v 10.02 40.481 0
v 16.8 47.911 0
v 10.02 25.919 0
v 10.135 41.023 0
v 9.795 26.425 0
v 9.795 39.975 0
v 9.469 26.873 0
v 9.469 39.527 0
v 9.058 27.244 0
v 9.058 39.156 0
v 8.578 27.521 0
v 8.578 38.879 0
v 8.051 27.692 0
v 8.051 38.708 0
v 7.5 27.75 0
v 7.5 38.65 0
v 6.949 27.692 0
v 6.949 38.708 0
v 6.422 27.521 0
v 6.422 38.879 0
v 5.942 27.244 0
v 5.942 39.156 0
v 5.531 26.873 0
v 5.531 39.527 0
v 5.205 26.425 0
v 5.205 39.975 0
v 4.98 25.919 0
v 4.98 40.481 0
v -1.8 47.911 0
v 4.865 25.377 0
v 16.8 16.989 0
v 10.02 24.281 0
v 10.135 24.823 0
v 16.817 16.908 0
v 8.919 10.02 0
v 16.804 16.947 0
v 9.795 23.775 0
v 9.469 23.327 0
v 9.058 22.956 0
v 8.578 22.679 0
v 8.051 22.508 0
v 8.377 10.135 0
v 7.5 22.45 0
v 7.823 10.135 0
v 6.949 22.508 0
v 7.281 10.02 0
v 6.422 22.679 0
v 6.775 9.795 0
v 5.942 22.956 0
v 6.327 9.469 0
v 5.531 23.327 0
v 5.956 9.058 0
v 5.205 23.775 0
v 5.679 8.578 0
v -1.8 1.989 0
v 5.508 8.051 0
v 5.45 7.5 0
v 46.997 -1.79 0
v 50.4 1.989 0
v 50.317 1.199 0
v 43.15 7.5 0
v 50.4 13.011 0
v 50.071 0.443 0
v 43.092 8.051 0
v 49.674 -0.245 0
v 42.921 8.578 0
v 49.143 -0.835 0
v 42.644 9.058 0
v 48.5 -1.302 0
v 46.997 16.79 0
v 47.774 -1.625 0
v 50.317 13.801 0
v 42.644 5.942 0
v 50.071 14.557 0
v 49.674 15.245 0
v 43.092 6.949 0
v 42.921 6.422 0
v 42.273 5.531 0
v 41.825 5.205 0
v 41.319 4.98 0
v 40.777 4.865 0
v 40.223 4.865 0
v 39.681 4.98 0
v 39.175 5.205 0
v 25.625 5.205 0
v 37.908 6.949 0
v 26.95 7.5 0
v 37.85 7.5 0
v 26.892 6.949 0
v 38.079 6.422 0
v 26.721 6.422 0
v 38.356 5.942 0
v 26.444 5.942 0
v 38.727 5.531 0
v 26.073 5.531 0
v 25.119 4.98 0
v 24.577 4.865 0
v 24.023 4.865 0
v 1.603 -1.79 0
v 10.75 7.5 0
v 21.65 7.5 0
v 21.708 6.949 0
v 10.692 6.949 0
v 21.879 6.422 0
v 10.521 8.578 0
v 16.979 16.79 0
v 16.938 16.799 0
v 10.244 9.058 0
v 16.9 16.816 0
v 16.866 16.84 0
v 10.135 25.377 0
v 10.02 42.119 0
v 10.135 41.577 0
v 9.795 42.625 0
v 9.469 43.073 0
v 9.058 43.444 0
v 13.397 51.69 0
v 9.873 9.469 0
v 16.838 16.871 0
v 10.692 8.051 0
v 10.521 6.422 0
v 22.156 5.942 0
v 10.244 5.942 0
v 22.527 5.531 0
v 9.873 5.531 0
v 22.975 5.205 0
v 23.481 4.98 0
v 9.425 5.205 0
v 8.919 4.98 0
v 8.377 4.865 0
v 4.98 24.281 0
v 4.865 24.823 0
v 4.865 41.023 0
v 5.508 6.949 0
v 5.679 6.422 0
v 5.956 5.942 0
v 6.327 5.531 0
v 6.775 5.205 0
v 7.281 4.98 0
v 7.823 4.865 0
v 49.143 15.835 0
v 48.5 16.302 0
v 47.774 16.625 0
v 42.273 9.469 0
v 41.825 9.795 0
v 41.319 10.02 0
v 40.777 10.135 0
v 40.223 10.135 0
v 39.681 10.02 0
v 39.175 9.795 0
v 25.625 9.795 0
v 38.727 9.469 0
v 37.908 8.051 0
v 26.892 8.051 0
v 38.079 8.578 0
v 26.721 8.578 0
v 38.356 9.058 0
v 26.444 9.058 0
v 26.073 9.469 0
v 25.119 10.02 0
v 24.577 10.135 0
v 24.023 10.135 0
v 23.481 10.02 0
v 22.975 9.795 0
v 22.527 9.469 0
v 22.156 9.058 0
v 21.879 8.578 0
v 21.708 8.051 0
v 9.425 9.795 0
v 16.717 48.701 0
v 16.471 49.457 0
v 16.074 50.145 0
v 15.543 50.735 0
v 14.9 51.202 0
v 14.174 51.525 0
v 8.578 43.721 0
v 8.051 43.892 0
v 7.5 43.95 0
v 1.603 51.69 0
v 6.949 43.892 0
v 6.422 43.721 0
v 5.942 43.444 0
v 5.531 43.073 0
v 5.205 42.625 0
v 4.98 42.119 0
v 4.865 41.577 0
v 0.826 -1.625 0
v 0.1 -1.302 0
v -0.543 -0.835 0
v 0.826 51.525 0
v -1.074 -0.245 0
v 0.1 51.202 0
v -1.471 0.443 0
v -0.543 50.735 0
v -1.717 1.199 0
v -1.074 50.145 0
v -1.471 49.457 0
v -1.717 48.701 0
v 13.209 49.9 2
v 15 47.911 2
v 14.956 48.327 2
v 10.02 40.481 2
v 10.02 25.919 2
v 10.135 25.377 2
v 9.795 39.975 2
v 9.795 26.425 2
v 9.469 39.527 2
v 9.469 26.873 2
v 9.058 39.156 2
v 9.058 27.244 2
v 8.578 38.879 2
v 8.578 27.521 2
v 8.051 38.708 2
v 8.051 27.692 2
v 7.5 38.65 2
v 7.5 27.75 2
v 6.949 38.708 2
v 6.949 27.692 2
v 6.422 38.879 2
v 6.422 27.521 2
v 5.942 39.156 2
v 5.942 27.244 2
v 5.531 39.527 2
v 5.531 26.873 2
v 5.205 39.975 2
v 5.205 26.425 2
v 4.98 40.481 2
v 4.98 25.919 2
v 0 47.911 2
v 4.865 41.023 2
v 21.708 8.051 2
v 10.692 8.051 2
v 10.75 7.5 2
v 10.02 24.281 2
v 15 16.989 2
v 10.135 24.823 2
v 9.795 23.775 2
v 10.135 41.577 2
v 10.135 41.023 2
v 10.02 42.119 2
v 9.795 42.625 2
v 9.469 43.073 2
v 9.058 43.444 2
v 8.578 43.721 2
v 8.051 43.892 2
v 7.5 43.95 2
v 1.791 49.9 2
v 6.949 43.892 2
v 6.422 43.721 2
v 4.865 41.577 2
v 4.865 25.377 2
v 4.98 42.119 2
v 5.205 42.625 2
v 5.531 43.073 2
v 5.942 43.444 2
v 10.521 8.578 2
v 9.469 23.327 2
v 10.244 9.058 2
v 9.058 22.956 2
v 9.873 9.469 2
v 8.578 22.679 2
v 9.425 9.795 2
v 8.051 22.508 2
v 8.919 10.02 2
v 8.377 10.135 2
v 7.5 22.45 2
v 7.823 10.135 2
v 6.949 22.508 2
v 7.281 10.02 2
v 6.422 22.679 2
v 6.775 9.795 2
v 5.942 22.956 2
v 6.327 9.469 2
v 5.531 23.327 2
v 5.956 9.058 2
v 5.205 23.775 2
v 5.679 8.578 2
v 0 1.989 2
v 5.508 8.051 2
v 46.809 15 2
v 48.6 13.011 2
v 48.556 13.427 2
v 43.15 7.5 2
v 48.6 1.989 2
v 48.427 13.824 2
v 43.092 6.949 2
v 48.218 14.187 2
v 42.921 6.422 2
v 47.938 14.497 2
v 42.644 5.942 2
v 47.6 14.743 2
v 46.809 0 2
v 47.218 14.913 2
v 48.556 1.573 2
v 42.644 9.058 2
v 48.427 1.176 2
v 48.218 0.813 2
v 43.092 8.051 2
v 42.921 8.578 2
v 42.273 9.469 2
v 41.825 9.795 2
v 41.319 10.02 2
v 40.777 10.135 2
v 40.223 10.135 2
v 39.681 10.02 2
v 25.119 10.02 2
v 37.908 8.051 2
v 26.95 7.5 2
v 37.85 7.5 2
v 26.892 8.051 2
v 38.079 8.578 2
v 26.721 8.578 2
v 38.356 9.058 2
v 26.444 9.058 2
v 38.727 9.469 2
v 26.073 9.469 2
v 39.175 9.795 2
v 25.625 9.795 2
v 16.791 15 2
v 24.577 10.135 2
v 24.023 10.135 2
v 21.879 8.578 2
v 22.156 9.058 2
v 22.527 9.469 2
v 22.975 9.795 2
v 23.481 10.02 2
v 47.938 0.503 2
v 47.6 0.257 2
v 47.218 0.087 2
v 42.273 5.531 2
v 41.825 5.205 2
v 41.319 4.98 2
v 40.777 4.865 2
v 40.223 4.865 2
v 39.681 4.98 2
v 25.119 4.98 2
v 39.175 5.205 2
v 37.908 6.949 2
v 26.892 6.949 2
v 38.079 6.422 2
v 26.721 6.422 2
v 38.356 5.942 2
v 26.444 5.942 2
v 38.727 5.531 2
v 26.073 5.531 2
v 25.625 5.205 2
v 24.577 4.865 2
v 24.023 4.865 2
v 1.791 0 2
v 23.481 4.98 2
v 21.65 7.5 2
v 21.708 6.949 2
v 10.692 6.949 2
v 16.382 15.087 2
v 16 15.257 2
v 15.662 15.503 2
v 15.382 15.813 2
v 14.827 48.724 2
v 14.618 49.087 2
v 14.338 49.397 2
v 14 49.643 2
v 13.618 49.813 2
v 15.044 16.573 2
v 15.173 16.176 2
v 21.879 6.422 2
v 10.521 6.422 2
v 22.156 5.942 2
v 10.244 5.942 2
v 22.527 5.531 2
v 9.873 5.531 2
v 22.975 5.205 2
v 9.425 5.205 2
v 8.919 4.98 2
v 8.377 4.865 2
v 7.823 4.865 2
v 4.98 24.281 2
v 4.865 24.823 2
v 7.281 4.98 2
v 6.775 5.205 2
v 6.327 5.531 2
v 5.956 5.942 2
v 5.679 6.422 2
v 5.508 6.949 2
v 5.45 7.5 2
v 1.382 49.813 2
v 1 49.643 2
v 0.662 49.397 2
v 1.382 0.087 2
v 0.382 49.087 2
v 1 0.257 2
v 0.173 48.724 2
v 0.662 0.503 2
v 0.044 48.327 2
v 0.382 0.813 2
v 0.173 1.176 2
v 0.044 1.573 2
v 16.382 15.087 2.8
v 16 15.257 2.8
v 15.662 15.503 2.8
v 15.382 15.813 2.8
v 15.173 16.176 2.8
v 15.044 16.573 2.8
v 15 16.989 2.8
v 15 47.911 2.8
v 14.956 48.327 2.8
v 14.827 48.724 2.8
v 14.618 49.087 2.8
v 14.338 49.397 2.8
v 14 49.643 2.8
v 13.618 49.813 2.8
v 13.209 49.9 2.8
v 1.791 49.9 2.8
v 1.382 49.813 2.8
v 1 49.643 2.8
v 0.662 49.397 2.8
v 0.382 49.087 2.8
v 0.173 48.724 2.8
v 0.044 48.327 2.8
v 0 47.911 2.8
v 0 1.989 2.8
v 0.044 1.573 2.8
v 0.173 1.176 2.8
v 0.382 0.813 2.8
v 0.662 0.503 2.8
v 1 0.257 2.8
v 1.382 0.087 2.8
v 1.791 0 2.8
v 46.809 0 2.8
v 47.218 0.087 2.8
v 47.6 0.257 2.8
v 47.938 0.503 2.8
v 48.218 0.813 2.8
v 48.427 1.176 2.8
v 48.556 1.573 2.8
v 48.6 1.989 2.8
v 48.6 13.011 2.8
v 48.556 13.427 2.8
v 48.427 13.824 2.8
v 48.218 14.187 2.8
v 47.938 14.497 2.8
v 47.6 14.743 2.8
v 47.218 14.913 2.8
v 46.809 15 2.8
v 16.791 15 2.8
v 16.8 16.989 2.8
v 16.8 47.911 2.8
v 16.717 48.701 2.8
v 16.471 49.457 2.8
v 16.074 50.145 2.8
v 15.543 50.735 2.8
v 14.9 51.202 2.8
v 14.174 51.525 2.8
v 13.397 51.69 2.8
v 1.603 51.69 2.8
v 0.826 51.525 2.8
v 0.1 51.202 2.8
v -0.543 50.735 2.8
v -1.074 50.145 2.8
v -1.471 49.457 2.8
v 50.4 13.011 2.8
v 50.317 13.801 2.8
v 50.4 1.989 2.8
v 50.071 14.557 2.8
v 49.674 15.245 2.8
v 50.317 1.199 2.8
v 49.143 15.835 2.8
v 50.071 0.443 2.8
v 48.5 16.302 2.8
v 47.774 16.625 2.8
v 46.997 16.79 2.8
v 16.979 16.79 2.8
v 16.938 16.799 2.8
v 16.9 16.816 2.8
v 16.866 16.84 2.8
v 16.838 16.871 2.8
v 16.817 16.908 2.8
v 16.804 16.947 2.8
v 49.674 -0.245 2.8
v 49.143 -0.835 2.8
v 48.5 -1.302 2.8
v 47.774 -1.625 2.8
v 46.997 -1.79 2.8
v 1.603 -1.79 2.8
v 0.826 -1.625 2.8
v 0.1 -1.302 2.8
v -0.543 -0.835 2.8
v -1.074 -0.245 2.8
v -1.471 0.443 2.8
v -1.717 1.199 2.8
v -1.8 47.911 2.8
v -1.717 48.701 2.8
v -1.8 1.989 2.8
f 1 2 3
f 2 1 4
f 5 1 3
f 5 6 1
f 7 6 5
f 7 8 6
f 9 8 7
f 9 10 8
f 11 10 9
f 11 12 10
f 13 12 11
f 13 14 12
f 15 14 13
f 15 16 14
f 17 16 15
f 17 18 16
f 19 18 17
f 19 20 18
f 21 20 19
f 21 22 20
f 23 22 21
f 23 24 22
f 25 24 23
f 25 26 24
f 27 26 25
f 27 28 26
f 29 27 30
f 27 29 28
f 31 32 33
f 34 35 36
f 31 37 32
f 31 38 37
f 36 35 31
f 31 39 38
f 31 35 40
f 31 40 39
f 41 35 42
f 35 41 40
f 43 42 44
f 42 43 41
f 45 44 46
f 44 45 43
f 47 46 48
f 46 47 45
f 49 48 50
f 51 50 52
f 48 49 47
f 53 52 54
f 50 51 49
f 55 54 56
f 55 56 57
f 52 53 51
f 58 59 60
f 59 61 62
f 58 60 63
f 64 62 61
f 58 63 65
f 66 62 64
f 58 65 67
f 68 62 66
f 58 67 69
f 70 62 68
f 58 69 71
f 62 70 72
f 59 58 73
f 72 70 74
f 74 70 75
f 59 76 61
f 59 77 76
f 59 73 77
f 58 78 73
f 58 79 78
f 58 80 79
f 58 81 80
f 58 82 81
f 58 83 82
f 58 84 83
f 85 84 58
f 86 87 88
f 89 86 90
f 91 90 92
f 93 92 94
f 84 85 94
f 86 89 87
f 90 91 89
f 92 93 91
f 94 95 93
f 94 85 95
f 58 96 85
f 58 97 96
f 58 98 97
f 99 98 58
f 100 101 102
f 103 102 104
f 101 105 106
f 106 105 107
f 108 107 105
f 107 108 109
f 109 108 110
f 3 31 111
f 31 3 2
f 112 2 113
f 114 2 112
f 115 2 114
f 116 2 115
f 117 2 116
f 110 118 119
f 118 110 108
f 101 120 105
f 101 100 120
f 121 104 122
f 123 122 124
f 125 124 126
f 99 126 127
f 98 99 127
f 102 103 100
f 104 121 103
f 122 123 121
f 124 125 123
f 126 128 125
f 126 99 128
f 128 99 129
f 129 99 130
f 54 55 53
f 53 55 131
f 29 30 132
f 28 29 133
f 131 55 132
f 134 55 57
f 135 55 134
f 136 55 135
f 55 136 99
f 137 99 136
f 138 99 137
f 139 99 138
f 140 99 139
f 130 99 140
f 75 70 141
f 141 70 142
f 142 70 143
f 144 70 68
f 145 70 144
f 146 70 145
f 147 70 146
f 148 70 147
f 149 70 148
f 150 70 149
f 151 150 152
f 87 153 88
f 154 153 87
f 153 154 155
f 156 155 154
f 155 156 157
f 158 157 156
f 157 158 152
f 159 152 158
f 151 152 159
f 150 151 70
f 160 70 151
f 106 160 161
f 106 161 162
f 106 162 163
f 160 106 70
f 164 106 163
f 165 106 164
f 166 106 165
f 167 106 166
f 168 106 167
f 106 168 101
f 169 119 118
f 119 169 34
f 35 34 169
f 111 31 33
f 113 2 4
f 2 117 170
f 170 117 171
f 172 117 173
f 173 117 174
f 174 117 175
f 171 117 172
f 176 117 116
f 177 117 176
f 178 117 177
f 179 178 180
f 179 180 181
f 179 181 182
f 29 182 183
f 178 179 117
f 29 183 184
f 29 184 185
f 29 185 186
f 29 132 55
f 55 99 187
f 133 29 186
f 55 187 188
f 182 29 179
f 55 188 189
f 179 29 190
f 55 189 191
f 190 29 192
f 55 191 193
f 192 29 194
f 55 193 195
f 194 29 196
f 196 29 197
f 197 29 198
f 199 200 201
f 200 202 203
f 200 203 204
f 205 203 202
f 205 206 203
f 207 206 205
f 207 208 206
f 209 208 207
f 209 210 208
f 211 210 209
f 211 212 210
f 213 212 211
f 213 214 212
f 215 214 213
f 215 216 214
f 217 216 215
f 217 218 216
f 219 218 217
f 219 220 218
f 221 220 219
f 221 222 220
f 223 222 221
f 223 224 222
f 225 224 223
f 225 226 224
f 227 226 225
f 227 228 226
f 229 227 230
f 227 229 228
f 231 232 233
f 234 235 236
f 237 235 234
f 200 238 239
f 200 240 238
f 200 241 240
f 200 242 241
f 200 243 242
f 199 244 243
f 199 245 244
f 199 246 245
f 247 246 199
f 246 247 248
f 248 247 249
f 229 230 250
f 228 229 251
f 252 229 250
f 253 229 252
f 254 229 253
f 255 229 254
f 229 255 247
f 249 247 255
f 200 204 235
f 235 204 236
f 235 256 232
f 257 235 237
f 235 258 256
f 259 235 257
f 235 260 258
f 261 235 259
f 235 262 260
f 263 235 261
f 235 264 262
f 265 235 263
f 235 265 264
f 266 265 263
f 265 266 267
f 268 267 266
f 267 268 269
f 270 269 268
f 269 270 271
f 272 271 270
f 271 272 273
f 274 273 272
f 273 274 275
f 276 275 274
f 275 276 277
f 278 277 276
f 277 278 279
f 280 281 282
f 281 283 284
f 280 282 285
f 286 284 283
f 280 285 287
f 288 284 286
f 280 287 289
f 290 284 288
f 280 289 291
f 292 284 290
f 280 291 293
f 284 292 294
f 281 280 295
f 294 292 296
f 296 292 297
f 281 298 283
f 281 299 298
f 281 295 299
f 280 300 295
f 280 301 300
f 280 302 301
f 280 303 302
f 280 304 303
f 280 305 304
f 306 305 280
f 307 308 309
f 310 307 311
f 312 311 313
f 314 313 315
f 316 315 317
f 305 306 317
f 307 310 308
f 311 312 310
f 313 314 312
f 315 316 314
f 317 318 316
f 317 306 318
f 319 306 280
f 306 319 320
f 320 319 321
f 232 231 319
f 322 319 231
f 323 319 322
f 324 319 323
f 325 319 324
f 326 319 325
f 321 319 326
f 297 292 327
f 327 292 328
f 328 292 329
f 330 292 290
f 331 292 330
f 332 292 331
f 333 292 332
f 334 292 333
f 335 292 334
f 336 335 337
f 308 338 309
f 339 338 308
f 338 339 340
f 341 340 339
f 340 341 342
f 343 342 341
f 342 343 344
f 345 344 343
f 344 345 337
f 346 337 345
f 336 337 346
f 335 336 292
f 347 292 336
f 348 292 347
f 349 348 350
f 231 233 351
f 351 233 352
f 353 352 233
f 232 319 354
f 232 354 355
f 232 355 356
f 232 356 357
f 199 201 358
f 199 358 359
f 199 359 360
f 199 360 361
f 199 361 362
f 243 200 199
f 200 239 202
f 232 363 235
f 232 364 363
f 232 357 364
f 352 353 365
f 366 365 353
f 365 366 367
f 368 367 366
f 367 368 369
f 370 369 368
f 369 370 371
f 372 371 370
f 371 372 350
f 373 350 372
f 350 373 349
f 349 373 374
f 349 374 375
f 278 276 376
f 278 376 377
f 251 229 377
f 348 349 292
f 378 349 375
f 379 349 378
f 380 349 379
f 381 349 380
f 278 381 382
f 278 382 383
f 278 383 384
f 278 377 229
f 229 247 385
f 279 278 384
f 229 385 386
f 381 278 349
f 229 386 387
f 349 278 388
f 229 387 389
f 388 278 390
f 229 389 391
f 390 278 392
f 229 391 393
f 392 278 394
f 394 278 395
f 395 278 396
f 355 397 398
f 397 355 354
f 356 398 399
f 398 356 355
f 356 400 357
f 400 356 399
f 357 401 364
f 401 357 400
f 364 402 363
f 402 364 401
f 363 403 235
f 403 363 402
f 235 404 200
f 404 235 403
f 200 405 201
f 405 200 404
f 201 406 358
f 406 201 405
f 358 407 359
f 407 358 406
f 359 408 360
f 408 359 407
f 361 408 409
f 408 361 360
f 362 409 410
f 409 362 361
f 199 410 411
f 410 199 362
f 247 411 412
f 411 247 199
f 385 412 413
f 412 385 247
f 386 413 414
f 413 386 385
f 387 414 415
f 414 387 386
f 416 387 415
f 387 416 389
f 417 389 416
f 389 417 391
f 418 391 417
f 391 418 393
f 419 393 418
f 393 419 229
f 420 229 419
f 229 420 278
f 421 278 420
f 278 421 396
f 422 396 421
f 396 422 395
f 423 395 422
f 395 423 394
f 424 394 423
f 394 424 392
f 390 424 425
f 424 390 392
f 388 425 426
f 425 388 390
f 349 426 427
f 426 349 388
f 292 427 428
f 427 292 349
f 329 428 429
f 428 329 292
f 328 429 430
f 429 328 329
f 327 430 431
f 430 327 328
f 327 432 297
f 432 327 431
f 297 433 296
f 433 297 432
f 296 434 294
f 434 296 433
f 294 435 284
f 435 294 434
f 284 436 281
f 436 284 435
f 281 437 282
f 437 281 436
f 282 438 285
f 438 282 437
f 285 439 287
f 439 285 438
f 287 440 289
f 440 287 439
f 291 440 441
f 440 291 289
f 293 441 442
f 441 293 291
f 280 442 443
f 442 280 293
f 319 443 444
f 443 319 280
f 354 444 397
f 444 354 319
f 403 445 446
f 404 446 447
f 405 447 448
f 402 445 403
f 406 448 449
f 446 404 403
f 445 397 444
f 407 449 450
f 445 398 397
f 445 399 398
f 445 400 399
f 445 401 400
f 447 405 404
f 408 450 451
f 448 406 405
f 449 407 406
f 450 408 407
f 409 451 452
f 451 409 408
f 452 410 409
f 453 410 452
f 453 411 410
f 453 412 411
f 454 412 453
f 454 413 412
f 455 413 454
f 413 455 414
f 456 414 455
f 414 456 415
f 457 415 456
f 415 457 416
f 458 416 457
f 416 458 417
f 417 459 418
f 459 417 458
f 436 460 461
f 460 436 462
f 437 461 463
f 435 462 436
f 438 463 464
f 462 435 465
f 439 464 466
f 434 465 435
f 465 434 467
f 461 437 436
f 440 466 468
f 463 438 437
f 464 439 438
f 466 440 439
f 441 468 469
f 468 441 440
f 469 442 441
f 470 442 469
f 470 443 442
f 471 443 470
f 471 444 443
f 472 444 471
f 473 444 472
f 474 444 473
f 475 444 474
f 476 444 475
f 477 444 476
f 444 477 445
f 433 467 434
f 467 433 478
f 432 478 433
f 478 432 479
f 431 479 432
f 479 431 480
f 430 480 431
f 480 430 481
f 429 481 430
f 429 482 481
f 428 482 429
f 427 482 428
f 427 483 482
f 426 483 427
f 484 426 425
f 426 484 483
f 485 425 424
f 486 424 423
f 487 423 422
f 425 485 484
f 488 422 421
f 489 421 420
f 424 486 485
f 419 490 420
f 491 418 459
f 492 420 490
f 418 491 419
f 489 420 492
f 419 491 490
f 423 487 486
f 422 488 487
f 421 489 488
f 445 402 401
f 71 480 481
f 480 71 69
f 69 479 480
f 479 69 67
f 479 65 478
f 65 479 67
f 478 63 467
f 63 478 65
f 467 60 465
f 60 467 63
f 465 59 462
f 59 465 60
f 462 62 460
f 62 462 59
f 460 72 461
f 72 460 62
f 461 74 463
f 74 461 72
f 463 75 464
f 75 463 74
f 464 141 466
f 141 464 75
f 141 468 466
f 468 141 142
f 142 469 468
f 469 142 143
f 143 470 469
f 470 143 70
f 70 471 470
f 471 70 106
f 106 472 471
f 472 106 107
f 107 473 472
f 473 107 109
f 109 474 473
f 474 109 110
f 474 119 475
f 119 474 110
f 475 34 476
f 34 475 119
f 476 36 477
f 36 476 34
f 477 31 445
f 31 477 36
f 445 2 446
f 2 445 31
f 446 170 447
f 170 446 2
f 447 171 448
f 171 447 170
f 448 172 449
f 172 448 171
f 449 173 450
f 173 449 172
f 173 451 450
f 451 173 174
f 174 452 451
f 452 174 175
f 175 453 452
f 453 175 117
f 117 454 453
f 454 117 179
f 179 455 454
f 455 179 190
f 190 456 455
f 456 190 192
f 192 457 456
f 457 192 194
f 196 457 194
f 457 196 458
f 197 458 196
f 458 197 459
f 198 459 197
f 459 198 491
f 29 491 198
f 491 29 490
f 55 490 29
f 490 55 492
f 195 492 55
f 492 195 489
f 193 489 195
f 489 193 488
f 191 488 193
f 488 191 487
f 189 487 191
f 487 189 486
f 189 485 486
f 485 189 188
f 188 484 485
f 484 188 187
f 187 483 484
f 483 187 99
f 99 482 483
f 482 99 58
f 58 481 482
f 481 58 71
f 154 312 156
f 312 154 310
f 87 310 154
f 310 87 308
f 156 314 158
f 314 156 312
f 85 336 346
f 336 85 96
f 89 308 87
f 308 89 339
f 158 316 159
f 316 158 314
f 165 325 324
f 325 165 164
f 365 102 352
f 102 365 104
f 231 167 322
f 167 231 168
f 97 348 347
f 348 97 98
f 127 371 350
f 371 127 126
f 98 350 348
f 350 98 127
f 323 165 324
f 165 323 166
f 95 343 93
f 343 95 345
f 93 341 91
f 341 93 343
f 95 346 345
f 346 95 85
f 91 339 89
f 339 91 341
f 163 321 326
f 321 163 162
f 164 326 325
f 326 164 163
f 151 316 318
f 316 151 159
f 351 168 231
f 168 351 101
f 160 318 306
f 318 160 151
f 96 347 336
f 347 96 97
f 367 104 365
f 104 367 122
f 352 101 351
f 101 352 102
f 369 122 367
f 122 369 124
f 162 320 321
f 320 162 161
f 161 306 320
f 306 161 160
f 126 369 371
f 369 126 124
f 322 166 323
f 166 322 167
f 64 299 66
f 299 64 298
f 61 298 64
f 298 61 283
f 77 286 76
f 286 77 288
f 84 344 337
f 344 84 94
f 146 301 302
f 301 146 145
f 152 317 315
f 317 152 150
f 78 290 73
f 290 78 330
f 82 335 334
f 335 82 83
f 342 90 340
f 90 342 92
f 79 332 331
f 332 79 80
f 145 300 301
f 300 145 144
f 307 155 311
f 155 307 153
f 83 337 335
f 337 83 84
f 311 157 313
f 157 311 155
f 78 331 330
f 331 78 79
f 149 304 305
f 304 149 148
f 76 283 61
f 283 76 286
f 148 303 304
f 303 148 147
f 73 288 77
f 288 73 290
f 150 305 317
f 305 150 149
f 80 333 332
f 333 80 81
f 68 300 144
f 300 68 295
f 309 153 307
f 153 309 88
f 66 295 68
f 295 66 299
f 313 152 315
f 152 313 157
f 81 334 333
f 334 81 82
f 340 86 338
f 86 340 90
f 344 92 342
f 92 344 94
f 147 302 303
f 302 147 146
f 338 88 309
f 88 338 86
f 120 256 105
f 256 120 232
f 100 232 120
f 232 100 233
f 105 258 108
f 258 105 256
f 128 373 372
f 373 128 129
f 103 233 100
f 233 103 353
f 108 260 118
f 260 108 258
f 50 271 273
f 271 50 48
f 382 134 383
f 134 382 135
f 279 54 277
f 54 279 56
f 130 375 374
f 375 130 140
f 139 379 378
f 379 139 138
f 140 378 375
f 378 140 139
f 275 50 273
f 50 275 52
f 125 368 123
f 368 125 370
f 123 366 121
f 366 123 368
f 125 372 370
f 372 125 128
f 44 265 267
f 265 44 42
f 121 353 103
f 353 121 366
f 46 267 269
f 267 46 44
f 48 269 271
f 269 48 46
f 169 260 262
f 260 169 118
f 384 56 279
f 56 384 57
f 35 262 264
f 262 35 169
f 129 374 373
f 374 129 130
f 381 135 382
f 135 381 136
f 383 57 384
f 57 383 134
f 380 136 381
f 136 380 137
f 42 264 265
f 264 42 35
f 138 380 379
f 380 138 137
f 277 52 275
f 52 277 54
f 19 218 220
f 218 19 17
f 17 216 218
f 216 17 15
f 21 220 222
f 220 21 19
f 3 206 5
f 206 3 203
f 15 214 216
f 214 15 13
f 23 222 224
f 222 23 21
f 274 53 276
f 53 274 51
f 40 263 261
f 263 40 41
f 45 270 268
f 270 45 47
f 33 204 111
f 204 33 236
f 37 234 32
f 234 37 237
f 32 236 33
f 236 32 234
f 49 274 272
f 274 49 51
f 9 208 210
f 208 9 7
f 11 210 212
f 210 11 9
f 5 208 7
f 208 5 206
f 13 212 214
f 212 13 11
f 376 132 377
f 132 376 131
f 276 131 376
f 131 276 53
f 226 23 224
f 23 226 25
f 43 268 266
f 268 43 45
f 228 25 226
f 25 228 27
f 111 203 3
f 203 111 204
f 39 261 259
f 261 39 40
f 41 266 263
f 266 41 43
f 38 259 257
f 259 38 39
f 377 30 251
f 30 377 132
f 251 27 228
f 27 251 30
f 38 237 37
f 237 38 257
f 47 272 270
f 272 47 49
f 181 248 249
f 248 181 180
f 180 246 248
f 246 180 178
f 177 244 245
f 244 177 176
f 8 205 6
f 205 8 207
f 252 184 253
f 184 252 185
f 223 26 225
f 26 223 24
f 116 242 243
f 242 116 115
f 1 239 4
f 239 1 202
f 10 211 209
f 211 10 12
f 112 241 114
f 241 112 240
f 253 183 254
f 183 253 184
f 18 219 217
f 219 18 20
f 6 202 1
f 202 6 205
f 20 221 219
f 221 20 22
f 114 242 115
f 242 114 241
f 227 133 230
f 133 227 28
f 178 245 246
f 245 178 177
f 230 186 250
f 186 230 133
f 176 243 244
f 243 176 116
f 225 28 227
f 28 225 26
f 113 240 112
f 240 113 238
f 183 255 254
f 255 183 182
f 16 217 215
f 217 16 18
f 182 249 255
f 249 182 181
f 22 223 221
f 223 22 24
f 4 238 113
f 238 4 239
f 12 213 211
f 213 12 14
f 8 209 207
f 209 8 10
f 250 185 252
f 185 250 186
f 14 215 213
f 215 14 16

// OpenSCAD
// T-Track definition: how wide is it?
trackWidth = 20.0;

// Mounting hardware definition: how long are the inserts you are using?
hardwareLength = 15.2;

// Extra space between T-track mounting brackets
extraSpace = 1.0;

// Screw hole size (make it a bit bigger than your screws)
holeSize = 5.3;

// Lower bar of the L: number of holes
lowerBarNumHoles = 3;

// Vertical bar of the L: number of holes
verticalBarNumHoles = 2;

// The width of the part
mainWidth = 15.0;

// Corner radius:
cornerRadius = 2;

// Main thickness:
thickness = 2.0;

// Rim thickness 
rimThickness = 0.8;

// Rim width
rimWidth = 1.8;

/* [Hidden] */
// Hole resolution
$fn = 30;


// Code imported from scad-utils:
// Copyright (c) 2013 Oskar Linde. All rights reserved.
// License: BSD
//
// This library contains basic 2D morphology operations
//
// outset(d=1)            - creates a polygon at an offset d outside a 2D shape
// inset(d=1)             - creates a polygon at an offset d inside a 2D shape
// fillet(r=1)            - adds fillets of radius r to all concave corners of a 2D shape
// rounding(r=1)          - adds rounding to all convex corners of a 2D shape
// shell(d,center=false)  - makes a shell of width d along the edge of a 2D shape
//                        - positive values of d places the shell on the outside
//                        - negative values of d places the shell on the inside
//                        - center=true and positive d places the shell centered on the edge

module outset(d=1) {
	// Bug workaround for older OpenSCAD versions
	minkowski() {
		circle(r=d);
		children();
	}
}

module outset_extruded(d=1) {
   projection(cut=true) minkowski() {
        cylinder(r=d);
        linear_extrude(center=true) children();
   }
}

module inset(d=1) {
	 render() inverse() outset(d=d) inverse() children();
}

module fillet(r=1) {
	inset(d=r) render() outset(d=r) children();
}

module rounding(r=1) {
	outset(d=r) inset(d=r) children();
}

module shell(d,center=false) {
	if (center && d > 0) {
		difference() {
			outset(d=d/2) children();
			inset(d=d/2) children();
		}
	}
	if (!center && d > 0) {
		difference() {
			outset(d=d) children();
			children();
		}
	}
	if (!center && d < 0) {
		difference() {
			children();
			inset(d=-d) children();
		}
	}
	if (d == 0) children();
}


// Below are for internal use only

module inverse() {
	difference() {
		square(1e5,center=true);
		children();
	}
}




// End import from scad-utils

extraHardwareSpace = (trackWidth - mainWidth) / 2;
lowerBarWidth = lowerBarNumHoles * (hardwareLength+extraSpace);
verticalBarHeight = verticalBarNumHoles * (hardwareLength+extraSpace) + extraHardwareSpace;


module bracket2DSquare () {
    square ([lowerBarWidth,mainWidth]);
    translate ([0,mainWidth,0]) {
        square ([mainWidth, verticalBarHeight]);
    }
}

module bracket2DRounded () {
    rounding(r=cornerRadius) fillet(r=cornerRadius) bracket2DSquare();
}

module rim2D () {
    shell(d=rimWidth) bracket2DRounded ();
}

module bracket3D () {
    linear_extrude (height=thickness) bracket2DRounded ();
    linear_extrude (height=thickness+rimThickness) rim2D();
}

module holePuncher (thisHole, numHoles) {
    if (thisHole < numHoles) {
        cylinder (d = holeSize, h = 4* thickness, center = true);
        translate ([hardwareLength+extraSpace,0,0]) {
            holePuncher (thisHole + 1, numHoles);
        }
    }
}

module punchlowerBarHoles () {
    translate ([(hardwareLength+extraSpace)/2,mainWidth/2,0]) {
        holePuncher(0,lowerBarNumHoles);
    }
}

module punchVerticalBarHoles () {
    translate ([mainWidth/2,mainWidth+extraHardwareSpace+hardwareLength/2,0]) {
        rotate (90) {
            holePuncher(0,verticalBarNumHoles);
        }
    }
}

difference () {
    bracket3D();
    punchlowerBarHoles();
    punchVerticalBarHoles();
}
